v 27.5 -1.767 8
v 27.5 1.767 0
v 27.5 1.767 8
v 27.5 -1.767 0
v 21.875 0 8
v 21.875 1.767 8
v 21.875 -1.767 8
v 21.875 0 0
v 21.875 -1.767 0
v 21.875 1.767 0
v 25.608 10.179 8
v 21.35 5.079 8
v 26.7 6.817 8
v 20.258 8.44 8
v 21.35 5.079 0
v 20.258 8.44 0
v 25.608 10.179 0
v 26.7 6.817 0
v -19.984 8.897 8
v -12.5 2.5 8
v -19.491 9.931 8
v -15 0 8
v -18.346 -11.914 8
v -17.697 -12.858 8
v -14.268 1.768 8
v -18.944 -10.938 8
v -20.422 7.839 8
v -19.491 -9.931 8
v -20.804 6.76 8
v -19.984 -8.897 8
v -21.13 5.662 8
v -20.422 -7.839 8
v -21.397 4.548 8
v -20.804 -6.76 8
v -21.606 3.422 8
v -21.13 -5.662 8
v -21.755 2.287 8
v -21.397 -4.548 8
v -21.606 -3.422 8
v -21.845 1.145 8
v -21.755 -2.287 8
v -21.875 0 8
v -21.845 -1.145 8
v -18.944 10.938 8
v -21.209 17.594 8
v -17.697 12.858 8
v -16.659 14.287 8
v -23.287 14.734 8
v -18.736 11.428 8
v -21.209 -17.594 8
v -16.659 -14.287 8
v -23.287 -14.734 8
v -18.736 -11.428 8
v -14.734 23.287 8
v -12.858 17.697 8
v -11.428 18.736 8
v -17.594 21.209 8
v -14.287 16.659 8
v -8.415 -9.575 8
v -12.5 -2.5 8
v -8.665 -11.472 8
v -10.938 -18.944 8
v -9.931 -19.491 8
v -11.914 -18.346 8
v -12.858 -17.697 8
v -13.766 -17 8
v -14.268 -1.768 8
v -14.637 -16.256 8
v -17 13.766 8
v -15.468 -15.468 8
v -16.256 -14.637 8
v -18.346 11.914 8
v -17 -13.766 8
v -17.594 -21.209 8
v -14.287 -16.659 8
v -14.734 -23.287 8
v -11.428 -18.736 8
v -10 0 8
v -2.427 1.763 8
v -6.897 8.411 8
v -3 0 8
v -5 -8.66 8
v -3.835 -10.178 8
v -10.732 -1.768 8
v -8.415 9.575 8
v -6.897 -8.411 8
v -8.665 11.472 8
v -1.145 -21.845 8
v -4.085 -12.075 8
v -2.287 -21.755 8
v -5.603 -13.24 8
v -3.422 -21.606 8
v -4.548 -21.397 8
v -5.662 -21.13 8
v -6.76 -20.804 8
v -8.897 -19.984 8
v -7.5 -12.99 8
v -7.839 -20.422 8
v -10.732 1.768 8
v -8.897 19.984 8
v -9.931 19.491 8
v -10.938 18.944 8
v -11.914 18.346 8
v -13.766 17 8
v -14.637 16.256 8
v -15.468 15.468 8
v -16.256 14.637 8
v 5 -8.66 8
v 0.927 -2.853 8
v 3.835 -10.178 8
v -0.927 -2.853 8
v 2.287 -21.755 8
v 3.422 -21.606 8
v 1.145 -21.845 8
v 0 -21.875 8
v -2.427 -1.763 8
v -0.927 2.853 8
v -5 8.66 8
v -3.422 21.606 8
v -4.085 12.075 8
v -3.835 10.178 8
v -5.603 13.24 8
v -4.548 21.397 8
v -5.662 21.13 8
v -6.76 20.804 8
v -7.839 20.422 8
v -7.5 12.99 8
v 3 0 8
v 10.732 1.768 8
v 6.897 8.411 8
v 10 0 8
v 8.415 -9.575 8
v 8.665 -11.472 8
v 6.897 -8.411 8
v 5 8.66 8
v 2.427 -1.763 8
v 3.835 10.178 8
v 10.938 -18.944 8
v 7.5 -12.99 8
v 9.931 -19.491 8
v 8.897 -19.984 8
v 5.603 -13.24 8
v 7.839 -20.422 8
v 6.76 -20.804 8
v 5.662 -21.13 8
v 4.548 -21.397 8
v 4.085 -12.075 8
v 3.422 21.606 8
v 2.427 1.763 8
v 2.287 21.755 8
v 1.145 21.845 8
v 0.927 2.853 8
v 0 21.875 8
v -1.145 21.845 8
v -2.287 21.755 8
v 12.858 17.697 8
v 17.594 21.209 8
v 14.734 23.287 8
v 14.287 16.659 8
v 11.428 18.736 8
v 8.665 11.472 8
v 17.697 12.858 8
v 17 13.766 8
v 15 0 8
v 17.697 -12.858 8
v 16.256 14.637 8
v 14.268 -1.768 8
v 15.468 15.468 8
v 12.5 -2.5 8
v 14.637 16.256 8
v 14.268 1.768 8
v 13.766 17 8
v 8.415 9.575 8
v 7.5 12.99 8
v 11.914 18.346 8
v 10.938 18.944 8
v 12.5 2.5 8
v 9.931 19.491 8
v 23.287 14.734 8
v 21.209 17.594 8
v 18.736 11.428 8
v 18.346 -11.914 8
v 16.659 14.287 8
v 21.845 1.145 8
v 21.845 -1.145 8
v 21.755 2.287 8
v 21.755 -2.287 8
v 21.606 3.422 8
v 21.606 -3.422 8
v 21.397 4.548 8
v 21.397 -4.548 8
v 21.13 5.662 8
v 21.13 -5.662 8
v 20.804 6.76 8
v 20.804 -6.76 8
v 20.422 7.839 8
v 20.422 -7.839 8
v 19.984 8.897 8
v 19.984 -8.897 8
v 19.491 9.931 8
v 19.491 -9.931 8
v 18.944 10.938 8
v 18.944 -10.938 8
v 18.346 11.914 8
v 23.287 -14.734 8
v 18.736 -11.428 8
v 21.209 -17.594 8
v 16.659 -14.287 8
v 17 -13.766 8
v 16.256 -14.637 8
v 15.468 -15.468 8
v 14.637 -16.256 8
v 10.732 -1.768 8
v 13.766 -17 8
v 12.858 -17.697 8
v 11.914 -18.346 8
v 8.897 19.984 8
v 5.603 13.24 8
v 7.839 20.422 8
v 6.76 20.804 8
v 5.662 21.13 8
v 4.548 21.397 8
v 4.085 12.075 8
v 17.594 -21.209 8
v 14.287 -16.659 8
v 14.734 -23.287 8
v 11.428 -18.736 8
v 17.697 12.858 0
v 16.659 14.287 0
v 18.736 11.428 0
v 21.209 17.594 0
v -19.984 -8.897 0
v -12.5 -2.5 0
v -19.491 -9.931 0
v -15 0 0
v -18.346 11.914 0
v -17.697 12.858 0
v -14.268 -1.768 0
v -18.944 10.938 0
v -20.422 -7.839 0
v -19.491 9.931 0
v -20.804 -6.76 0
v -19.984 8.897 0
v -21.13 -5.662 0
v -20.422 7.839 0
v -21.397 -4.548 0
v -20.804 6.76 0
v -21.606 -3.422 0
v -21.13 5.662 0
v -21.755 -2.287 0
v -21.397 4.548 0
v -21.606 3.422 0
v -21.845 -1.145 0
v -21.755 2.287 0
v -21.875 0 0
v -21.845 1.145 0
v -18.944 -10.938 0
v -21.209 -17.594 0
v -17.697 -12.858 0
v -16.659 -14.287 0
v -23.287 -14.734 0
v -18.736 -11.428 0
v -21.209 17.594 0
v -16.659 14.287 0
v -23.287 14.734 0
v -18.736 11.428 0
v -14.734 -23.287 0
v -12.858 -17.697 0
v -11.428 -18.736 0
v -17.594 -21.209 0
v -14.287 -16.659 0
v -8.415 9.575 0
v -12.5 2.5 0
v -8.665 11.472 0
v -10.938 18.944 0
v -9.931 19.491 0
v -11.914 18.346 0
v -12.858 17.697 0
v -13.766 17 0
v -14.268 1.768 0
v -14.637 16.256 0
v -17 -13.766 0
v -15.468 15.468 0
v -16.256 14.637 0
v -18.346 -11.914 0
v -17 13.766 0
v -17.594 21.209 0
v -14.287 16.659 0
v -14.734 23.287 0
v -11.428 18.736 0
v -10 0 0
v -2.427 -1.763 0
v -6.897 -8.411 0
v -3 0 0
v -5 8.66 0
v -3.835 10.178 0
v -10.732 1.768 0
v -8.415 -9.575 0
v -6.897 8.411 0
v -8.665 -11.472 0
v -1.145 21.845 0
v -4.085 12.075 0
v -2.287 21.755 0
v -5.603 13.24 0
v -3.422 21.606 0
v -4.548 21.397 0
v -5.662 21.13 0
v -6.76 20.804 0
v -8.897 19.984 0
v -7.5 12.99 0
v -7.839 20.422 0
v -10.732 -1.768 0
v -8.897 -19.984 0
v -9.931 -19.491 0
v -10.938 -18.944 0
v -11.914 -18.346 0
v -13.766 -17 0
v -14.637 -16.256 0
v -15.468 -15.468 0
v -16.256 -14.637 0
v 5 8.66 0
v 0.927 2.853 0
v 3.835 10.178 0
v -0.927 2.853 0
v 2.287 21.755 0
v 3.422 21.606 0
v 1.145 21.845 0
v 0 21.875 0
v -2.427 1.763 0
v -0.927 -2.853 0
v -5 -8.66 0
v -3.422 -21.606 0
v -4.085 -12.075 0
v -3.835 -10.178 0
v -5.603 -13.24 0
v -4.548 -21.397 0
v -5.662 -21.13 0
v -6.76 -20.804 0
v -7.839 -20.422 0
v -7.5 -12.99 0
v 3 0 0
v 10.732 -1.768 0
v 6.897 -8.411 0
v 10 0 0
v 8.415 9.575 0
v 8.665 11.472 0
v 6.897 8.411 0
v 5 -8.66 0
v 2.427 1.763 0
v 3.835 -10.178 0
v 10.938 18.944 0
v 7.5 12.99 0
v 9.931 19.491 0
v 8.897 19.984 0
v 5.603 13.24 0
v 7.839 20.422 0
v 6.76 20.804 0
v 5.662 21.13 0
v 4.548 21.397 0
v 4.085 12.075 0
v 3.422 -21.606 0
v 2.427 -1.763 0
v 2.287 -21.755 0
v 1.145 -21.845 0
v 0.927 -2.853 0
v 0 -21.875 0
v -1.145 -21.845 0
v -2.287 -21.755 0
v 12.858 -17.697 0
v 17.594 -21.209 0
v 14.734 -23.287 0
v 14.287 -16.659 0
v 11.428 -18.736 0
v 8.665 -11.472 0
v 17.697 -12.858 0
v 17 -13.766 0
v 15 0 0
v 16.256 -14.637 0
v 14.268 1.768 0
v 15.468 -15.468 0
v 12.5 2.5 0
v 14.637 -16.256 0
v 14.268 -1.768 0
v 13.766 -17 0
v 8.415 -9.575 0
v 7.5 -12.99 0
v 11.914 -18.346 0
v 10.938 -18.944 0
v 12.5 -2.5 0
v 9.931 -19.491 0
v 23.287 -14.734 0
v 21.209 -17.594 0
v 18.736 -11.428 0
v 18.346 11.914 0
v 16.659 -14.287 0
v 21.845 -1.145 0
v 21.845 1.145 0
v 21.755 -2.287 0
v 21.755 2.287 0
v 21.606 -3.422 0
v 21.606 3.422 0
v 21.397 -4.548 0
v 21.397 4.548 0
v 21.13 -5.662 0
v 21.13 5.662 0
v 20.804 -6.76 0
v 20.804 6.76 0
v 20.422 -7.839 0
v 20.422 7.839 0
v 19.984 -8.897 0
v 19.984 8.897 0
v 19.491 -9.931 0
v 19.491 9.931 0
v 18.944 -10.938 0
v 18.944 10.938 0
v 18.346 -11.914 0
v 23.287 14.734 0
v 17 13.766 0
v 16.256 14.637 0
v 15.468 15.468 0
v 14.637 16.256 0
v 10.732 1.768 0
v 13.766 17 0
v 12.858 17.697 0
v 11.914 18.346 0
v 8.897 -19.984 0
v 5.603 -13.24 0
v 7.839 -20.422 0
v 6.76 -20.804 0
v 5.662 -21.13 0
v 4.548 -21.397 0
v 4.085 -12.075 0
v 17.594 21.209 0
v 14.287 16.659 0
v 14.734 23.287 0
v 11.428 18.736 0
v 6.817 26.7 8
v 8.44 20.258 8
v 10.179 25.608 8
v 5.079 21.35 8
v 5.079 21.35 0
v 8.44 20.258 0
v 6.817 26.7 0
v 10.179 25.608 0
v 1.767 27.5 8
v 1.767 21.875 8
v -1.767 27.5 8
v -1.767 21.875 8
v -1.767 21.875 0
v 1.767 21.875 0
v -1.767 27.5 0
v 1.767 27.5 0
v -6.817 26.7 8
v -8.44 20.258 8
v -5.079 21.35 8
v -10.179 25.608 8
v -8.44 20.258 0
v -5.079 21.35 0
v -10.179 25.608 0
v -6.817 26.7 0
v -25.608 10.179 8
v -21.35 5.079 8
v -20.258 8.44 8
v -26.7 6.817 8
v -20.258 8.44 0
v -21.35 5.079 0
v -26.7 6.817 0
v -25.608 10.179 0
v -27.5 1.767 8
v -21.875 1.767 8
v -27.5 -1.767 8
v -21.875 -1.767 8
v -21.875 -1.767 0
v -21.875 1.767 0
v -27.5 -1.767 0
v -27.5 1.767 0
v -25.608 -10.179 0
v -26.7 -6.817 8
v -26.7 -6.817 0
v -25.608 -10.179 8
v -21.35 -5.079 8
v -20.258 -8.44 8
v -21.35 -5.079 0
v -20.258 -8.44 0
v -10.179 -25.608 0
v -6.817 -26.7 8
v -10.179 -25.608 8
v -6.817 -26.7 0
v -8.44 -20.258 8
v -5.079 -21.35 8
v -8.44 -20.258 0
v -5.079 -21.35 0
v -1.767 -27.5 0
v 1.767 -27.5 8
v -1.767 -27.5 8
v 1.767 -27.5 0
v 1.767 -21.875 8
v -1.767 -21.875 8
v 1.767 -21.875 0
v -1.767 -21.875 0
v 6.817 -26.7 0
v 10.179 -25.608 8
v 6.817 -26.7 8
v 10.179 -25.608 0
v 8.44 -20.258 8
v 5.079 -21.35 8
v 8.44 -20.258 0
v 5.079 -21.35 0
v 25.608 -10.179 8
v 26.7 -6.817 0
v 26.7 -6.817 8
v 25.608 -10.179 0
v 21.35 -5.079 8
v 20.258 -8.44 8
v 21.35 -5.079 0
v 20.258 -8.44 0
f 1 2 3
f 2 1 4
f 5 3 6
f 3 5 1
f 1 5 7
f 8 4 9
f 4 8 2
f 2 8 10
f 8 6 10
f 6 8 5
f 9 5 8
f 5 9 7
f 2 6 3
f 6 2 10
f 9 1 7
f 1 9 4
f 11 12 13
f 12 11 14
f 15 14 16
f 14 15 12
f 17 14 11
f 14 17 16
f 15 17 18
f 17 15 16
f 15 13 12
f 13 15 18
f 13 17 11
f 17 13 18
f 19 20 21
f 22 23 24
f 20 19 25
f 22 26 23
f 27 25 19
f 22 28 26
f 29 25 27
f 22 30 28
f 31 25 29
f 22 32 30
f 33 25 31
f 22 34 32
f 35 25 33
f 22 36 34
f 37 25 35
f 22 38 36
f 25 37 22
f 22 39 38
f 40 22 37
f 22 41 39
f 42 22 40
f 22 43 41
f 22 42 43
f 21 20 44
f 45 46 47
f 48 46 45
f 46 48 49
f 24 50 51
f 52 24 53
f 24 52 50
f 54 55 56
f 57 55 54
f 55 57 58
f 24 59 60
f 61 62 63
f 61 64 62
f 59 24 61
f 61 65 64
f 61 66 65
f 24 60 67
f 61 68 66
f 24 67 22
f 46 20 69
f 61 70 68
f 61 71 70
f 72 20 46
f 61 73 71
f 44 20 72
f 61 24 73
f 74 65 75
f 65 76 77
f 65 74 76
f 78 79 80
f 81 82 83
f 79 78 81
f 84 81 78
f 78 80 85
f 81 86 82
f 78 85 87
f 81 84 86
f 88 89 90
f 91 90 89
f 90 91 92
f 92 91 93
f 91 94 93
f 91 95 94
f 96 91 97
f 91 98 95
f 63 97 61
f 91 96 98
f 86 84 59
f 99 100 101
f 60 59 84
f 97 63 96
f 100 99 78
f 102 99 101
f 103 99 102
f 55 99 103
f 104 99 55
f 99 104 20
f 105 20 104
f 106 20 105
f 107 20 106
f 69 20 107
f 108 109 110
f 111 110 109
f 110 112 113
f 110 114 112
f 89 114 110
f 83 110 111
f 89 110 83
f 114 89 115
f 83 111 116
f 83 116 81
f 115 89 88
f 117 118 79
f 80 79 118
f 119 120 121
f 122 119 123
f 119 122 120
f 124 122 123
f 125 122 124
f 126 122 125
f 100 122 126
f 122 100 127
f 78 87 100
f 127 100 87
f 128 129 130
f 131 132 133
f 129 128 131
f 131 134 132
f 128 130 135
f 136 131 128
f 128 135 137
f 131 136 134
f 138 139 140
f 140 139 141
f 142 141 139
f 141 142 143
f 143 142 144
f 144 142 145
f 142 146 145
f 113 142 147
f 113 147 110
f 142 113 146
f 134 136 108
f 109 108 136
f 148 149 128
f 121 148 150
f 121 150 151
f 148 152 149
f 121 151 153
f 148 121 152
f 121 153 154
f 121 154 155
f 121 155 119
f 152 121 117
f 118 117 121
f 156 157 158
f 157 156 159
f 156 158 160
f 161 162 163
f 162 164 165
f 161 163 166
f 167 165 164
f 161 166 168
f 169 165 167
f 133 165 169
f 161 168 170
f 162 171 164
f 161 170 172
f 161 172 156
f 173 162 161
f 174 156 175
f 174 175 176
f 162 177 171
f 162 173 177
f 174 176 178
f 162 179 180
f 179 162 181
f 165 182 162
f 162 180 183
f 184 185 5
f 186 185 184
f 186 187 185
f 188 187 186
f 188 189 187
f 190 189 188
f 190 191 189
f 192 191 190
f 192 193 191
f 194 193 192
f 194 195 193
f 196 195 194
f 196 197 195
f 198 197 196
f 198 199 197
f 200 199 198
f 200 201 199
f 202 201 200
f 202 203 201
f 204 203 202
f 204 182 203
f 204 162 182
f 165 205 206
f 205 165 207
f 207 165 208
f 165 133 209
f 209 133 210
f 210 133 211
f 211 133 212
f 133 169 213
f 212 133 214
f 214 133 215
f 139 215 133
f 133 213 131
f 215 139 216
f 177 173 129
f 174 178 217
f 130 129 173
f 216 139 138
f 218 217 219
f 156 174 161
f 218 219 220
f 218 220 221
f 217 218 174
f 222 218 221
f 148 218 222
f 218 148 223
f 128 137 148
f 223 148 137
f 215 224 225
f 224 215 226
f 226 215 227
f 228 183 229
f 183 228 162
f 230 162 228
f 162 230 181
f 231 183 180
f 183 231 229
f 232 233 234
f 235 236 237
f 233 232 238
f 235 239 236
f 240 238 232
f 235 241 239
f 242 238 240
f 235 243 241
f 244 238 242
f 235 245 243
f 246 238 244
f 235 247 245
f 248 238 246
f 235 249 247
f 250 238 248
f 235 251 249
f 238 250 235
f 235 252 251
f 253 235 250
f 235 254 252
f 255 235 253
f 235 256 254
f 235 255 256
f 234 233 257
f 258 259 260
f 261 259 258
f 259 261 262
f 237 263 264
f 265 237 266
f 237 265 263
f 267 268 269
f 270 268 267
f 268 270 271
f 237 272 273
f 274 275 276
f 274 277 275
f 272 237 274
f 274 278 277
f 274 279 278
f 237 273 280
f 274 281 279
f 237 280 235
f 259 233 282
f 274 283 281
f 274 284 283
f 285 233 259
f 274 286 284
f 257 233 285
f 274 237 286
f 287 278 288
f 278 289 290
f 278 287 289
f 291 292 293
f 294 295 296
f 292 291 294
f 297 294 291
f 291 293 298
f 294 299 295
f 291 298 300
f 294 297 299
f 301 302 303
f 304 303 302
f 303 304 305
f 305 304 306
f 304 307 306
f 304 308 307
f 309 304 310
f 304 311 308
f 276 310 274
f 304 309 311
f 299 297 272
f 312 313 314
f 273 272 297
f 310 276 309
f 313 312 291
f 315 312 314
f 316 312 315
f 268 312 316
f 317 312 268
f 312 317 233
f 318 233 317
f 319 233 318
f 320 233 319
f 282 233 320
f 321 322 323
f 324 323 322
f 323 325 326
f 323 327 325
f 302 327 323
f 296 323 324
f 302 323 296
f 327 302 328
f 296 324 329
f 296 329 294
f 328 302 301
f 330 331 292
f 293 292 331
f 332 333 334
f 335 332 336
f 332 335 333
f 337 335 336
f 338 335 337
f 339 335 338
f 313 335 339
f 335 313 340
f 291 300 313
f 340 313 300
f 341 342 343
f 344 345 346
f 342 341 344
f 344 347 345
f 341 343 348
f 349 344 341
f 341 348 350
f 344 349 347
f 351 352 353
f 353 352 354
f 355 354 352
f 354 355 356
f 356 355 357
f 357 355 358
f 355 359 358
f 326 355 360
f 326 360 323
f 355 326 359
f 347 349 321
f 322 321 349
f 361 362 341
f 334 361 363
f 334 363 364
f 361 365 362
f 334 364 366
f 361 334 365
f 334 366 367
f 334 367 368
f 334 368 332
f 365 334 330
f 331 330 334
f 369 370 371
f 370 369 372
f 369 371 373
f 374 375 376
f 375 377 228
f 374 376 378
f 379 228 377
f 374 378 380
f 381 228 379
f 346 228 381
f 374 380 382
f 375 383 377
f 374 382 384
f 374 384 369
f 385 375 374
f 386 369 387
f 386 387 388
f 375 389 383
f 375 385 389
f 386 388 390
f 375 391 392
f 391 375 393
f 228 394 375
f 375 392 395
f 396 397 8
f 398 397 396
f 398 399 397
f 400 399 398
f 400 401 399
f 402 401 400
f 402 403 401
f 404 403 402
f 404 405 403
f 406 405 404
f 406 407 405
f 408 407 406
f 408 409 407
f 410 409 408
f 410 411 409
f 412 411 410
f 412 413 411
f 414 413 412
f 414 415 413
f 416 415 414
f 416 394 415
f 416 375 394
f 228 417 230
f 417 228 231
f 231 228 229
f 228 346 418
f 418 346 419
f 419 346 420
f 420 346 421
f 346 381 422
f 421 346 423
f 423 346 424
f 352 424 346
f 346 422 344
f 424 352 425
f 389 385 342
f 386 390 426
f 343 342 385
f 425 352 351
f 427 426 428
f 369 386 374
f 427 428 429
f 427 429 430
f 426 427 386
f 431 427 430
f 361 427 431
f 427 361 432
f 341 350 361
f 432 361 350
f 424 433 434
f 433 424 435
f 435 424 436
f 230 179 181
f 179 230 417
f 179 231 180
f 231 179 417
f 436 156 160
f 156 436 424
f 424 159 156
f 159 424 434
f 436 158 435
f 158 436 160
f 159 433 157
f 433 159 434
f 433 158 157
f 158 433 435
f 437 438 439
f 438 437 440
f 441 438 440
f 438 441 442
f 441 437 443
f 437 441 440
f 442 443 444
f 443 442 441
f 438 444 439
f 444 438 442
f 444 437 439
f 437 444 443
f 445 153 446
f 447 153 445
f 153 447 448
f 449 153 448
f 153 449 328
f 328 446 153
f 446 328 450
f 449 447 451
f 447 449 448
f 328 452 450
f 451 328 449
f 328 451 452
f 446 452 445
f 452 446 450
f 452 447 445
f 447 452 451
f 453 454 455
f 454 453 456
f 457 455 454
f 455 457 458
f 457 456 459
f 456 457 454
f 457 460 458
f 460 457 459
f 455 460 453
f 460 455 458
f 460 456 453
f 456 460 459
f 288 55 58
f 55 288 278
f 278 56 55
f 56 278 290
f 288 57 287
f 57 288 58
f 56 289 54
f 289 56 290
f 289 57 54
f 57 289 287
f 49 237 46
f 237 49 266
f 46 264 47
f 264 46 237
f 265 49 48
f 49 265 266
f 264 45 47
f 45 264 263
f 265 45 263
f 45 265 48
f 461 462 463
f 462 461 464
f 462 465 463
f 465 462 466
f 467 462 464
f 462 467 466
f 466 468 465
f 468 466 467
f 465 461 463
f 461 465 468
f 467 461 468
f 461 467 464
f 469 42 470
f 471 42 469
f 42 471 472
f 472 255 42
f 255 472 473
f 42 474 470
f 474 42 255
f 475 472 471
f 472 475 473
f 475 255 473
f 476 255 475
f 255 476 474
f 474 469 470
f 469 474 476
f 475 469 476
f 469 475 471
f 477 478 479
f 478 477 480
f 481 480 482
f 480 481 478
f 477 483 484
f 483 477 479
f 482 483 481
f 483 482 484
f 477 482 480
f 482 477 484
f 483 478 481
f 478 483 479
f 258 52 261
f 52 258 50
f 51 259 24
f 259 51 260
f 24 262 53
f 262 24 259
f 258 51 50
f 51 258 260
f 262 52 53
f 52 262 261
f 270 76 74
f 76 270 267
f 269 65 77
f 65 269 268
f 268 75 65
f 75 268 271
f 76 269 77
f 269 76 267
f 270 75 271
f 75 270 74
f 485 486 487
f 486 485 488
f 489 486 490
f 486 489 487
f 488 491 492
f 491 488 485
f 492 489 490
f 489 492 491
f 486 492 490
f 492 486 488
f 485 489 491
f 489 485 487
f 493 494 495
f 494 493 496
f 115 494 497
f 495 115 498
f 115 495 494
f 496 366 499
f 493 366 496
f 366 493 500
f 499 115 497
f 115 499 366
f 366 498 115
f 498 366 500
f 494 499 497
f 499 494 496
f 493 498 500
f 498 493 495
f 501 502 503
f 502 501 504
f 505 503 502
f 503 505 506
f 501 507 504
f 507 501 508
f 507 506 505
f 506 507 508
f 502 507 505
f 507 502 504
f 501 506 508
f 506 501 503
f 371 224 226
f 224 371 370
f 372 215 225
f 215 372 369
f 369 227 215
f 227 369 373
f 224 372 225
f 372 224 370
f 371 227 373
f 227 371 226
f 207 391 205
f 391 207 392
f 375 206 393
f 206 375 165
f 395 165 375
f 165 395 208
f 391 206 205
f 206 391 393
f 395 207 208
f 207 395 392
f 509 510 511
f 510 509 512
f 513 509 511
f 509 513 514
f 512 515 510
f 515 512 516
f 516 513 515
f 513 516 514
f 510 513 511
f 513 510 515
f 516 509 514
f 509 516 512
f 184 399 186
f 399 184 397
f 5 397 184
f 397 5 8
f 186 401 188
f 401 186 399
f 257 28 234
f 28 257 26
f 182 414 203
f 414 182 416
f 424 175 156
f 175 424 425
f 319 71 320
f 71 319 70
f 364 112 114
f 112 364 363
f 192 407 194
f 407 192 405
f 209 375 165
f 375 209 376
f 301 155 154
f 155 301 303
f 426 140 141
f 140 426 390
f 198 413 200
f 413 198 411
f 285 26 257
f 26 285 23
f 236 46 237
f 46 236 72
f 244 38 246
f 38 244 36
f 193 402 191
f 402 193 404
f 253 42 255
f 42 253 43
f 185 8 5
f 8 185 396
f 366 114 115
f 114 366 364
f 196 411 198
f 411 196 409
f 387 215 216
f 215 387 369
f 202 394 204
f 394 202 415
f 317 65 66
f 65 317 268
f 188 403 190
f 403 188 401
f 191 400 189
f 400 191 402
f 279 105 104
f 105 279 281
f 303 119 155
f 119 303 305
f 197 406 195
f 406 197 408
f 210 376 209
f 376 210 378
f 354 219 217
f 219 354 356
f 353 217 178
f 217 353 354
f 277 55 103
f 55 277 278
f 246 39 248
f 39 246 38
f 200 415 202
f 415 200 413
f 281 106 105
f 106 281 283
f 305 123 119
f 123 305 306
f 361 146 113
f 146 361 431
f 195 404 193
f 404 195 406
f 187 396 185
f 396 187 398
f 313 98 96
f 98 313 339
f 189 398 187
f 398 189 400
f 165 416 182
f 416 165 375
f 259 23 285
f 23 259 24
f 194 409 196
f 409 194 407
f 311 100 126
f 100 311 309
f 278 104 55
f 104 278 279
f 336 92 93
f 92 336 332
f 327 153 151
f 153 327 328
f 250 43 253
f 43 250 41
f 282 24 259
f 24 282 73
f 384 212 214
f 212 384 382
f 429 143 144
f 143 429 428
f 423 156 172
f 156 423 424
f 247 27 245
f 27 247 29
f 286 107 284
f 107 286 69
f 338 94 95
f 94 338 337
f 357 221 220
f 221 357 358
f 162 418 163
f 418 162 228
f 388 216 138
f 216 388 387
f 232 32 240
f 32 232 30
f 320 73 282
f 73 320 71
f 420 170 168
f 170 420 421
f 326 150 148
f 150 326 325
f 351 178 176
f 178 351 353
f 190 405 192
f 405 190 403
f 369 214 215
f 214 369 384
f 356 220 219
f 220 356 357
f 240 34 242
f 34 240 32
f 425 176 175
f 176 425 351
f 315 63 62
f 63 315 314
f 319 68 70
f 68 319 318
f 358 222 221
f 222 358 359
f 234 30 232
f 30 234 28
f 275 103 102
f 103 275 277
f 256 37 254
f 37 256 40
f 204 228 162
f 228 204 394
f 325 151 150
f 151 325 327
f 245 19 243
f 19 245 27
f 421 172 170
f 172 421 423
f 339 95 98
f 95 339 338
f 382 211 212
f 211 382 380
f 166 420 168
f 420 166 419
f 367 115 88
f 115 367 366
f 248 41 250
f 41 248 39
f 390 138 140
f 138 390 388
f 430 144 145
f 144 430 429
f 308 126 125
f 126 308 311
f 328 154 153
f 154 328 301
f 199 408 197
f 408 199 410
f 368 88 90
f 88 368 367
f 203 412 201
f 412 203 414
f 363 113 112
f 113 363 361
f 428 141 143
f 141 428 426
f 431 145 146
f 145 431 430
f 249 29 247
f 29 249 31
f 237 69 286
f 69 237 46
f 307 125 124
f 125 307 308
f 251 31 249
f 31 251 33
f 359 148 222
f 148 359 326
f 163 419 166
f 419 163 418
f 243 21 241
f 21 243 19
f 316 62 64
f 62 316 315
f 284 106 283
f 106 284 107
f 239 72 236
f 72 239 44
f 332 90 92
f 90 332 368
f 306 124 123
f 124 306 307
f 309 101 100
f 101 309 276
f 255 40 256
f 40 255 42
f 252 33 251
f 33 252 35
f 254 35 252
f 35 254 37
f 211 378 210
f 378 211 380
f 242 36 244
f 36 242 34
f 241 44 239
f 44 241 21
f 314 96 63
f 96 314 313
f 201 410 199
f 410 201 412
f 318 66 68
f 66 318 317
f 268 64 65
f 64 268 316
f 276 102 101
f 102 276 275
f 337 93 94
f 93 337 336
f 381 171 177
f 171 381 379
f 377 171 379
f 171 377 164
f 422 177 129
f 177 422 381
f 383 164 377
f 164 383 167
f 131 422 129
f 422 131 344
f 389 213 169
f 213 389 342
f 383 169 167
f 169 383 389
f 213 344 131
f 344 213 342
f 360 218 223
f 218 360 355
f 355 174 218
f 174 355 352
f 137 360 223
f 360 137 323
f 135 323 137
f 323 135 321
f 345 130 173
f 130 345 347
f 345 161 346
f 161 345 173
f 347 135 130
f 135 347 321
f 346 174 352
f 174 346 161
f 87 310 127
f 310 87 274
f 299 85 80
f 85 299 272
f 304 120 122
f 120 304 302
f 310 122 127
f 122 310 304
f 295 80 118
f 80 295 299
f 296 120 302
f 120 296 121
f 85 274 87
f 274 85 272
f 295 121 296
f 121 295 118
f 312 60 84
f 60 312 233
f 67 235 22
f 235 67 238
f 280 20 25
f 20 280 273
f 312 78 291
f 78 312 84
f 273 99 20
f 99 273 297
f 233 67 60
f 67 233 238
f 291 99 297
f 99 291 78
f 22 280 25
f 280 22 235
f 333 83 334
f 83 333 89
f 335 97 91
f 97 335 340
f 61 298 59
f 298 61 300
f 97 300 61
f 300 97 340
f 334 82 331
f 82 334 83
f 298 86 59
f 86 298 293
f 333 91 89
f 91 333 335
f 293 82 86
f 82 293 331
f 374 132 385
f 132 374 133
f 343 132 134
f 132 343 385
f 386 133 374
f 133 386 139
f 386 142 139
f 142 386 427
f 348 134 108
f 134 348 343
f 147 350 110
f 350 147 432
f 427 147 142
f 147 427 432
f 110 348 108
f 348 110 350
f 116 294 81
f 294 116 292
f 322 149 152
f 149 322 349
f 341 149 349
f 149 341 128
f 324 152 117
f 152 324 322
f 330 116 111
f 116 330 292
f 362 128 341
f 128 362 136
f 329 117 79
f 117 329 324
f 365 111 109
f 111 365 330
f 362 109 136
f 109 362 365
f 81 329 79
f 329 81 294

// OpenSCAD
tooth_count = 20;
module_size = 2.5;
thickness = 8;
bore_diameter = 6;
hole_count = 6;
hole_diameter = 5;

pitch_radius = module_size * tooth_count / 2;
addendum = module_size;
dedendum = 1.25 * module_size;
root_radius = pitch_radius - dedendum;
outer_radius = pitch_radius + addendum;
tooth_arc = 2 * PI * pitch_radius / tooth_count;
tooth_thickness = tooth_arc * 0.45;

module tooth(angle) {
    rotate([0, 0, angle])
        translate([root_radius, -tooth_thickness / 2, 0])
            cube([
                outer_radius - root_radius,
                tooth_thickness,
                thickness
            ], center = false);
}

module main() {
    difference() {
        union() {
            cylinder(r = root_radius, h = thickness, $fn = tooth_count * 6);
            for (i = [0 : tooth_count - 1])
                tooth(i * 360 / tooth_count);
        }
        cylinder(d = bore_diameter, h = thickness + 2, center = false);
        for (i = [0 : hole_count - 1])
            rotate([0, 0, i * 360 / hole_count])
                translate([pitch_radius * 0.5, 0, 0])
                    cylinder(d = hole_diameter, h = thickness + 2, center = false);
    }
}

main();
